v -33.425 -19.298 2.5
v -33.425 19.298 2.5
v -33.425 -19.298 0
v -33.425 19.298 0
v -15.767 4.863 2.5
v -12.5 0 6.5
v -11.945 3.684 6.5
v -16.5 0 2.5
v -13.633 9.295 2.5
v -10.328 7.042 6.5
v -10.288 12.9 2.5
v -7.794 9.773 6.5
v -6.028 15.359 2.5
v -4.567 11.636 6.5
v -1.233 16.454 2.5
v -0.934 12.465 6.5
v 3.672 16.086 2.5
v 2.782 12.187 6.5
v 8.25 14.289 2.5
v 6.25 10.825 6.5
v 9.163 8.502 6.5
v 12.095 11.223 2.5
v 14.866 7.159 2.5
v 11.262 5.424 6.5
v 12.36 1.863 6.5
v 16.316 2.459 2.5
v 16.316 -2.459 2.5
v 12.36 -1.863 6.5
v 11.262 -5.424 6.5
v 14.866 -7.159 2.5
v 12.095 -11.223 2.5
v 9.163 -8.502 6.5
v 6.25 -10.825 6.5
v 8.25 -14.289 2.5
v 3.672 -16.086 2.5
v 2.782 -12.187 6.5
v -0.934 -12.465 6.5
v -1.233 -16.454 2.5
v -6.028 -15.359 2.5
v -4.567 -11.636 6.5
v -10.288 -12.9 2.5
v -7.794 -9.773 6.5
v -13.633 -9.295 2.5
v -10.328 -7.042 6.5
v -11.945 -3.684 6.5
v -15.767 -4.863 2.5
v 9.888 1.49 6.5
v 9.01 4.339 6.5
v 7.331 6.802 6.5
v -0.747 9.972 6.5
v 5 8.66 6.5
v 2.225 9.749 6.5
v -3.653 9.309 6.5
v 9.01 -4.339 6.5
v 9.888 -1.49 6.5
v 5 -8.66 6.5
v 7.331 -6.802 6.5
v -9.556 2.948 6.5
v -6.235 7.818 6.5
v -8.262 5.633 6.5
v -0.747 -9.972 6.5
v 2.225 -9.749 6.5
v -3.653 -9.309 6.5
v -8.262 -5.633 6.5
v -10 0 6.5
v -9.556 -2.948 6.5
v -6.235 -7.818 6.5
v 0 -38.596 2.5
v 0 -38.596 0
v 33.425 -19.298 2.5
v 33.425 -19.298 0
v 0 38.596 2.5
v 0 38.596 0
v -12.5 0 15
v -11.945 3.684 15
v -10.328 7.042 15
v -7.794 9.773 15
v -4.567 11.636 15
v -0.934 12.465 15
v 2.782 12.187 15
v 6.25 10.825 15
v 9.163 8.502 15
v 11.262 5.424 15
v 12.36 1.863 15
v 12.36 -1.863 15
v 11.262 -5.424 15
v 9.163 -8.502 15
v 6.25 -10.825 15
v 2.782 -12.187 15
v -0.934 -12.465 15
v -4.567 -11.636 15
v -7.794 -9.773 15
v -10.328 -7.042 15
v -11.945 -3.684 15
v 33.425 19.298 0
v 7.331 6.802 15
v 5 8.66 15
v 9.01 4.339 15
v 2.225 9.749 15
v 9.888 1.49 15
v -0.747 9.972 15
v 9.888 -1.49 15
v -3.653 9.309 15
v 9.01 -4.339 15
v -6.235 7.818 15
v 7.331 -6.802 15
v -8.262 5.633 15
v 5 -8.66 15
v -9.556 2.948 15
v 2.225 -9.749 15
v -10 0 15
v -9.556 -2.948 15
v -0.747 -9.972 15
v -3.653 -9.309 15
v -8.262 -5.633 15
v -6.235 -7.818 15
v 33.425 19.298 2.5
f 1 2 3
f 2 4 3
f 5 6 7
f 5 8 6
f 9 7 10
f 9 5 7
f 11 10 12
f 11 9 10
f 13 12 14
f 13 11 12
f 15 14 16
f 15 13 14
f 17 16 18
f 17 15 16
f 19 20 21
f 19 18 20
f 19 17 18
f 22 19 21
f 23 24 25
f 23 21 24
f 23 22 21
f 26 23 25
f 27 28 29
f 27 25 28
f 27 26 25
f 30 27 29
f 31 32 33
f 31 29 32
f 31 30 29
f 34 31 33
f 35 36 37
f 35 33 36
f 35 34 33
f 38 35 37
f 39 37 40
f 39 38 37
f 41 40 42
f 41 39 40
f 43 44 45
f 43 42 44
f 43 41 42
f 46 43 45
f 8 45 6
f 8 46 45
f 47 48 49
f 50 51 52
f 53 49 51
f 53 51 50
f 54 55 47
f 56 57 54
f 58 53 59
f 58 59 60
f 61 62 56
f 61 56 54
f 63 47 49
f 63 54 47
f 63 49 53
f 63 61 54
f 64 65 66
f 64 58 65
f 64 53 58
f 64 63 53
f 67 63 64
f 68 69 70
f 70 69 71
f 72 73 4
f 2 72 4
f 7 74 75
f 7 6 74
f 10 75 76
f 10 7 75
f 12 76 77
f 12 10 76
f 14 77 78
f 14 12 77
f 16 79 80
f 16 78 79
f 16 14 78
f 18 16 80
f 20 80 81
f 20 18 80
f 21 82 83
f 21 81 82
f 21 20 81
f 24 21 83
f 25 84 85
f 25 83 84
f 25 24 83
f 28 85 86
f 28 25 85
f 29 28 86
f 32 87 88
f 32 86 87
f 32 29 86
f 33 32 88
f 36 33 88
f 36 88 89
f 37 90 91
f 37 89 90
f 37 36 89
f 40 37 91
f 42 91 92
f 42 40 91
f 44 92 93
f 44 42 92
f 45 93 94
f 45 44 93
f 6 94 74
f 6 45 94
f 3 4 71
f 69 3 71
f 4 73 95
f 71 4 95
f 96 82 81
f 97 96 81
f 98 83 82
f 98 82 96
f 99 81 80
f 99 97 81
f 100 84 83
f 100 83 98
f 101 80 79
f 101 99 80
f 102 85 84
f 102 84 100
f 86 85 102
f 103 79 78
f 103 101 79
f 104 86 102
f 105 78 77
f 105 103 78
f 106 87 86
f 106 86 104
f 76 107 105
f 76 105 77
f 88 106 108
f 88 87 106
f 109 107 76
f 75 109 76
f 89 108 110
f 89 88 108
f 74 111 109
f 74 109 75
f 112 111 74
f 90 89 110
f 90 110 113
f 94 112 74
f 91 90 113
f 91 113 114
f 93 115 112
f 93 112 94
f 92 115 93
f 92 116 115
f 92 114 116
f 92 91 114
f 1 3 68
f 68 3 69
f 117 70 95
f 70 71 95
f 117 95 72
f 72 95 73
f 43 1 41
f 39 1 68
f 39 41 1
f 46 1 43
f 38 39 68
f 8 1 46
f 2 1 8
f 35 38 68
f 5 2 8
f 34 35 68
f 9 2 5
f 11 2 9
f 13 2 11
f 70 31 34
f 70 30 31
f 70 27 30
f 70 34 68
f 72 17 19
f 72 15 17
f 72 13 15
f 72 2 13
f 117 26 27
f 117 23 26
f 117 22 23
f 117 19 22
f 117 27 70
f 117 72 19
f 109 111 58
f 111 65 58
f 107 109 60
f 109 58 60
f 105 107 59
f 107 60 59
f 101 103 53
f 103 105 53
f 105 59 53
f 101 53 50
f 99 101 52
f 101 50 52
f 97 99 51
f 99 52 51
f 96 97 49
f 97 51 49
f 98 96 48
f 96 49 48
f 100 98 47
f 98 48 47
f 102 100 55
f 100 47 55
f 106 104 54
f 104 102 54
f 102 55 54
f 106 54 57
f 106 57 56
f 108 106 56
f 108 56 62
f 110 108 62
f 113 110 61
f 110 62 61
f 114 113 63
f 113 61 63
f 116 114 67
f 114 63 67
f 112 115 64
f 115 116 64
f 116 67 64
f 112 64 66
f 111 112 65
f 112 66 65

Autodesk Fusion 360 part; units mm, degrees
sketch "Sketch1" plane through (0, 0, 0) normal (0, 0, 1) x (1, 0, 0)
  line L0 (33.4251, -19.298) -> (33.4251, 19.298)
  line L1 (33.4251, 19.298) -> (0, 38.596)
  line L2 (0, 38.596) -> (-33.4251, 19.298)
  line L3 (-33.4251, 19.298) -> (-33.4251, -19.298)
  line L4 (-33.4251, -19.298) -> (0, -38.596)
  line L5 (0, -38.596) -> (33.4251, -19.298)
  dimension "d1" = 38.596
extrude "Extrude1" add sketch "Sketch1" along normal blind 2.5
sketch "Sketch2" plane through (0, 0, 2.5) normal (0, 0, 1) x (-1, 0, 0)
  line L0 (0, 38.596) -> (-33.4251, 19.298)
  line L1 (-33.4251, 19.298) -> (-33.4251, -19.298)
  line L2 (-33.4251, -19.298) -> (0, -38.596)
  line L3 (0, -38.596) -> (33.4251, -19.298)
  line L4 (33.4251, -19.298) -> (33.4251, 19.298)
  line L5 (33.4251, 19.298) -> (0, 38.596)
  circle A0 centre (0, 0) radius 16.5
  dimension "d4" = 33
extrude "Extrude2" add sketch "Sketch2" along normal blind 4 draft -45 contours A0
sketch "Sketch3" plane through (0, 0, 6.5) normal (0, 0, 1) x (-1, 0, 0)
  circle A0 centre (0, 0) radius 12.5
  circle A1 centre (0, 0) radius 10
  dimension "d7" = 20
extrude "Extrude3" add sketch "Sketch3" along normal blind 8.5
